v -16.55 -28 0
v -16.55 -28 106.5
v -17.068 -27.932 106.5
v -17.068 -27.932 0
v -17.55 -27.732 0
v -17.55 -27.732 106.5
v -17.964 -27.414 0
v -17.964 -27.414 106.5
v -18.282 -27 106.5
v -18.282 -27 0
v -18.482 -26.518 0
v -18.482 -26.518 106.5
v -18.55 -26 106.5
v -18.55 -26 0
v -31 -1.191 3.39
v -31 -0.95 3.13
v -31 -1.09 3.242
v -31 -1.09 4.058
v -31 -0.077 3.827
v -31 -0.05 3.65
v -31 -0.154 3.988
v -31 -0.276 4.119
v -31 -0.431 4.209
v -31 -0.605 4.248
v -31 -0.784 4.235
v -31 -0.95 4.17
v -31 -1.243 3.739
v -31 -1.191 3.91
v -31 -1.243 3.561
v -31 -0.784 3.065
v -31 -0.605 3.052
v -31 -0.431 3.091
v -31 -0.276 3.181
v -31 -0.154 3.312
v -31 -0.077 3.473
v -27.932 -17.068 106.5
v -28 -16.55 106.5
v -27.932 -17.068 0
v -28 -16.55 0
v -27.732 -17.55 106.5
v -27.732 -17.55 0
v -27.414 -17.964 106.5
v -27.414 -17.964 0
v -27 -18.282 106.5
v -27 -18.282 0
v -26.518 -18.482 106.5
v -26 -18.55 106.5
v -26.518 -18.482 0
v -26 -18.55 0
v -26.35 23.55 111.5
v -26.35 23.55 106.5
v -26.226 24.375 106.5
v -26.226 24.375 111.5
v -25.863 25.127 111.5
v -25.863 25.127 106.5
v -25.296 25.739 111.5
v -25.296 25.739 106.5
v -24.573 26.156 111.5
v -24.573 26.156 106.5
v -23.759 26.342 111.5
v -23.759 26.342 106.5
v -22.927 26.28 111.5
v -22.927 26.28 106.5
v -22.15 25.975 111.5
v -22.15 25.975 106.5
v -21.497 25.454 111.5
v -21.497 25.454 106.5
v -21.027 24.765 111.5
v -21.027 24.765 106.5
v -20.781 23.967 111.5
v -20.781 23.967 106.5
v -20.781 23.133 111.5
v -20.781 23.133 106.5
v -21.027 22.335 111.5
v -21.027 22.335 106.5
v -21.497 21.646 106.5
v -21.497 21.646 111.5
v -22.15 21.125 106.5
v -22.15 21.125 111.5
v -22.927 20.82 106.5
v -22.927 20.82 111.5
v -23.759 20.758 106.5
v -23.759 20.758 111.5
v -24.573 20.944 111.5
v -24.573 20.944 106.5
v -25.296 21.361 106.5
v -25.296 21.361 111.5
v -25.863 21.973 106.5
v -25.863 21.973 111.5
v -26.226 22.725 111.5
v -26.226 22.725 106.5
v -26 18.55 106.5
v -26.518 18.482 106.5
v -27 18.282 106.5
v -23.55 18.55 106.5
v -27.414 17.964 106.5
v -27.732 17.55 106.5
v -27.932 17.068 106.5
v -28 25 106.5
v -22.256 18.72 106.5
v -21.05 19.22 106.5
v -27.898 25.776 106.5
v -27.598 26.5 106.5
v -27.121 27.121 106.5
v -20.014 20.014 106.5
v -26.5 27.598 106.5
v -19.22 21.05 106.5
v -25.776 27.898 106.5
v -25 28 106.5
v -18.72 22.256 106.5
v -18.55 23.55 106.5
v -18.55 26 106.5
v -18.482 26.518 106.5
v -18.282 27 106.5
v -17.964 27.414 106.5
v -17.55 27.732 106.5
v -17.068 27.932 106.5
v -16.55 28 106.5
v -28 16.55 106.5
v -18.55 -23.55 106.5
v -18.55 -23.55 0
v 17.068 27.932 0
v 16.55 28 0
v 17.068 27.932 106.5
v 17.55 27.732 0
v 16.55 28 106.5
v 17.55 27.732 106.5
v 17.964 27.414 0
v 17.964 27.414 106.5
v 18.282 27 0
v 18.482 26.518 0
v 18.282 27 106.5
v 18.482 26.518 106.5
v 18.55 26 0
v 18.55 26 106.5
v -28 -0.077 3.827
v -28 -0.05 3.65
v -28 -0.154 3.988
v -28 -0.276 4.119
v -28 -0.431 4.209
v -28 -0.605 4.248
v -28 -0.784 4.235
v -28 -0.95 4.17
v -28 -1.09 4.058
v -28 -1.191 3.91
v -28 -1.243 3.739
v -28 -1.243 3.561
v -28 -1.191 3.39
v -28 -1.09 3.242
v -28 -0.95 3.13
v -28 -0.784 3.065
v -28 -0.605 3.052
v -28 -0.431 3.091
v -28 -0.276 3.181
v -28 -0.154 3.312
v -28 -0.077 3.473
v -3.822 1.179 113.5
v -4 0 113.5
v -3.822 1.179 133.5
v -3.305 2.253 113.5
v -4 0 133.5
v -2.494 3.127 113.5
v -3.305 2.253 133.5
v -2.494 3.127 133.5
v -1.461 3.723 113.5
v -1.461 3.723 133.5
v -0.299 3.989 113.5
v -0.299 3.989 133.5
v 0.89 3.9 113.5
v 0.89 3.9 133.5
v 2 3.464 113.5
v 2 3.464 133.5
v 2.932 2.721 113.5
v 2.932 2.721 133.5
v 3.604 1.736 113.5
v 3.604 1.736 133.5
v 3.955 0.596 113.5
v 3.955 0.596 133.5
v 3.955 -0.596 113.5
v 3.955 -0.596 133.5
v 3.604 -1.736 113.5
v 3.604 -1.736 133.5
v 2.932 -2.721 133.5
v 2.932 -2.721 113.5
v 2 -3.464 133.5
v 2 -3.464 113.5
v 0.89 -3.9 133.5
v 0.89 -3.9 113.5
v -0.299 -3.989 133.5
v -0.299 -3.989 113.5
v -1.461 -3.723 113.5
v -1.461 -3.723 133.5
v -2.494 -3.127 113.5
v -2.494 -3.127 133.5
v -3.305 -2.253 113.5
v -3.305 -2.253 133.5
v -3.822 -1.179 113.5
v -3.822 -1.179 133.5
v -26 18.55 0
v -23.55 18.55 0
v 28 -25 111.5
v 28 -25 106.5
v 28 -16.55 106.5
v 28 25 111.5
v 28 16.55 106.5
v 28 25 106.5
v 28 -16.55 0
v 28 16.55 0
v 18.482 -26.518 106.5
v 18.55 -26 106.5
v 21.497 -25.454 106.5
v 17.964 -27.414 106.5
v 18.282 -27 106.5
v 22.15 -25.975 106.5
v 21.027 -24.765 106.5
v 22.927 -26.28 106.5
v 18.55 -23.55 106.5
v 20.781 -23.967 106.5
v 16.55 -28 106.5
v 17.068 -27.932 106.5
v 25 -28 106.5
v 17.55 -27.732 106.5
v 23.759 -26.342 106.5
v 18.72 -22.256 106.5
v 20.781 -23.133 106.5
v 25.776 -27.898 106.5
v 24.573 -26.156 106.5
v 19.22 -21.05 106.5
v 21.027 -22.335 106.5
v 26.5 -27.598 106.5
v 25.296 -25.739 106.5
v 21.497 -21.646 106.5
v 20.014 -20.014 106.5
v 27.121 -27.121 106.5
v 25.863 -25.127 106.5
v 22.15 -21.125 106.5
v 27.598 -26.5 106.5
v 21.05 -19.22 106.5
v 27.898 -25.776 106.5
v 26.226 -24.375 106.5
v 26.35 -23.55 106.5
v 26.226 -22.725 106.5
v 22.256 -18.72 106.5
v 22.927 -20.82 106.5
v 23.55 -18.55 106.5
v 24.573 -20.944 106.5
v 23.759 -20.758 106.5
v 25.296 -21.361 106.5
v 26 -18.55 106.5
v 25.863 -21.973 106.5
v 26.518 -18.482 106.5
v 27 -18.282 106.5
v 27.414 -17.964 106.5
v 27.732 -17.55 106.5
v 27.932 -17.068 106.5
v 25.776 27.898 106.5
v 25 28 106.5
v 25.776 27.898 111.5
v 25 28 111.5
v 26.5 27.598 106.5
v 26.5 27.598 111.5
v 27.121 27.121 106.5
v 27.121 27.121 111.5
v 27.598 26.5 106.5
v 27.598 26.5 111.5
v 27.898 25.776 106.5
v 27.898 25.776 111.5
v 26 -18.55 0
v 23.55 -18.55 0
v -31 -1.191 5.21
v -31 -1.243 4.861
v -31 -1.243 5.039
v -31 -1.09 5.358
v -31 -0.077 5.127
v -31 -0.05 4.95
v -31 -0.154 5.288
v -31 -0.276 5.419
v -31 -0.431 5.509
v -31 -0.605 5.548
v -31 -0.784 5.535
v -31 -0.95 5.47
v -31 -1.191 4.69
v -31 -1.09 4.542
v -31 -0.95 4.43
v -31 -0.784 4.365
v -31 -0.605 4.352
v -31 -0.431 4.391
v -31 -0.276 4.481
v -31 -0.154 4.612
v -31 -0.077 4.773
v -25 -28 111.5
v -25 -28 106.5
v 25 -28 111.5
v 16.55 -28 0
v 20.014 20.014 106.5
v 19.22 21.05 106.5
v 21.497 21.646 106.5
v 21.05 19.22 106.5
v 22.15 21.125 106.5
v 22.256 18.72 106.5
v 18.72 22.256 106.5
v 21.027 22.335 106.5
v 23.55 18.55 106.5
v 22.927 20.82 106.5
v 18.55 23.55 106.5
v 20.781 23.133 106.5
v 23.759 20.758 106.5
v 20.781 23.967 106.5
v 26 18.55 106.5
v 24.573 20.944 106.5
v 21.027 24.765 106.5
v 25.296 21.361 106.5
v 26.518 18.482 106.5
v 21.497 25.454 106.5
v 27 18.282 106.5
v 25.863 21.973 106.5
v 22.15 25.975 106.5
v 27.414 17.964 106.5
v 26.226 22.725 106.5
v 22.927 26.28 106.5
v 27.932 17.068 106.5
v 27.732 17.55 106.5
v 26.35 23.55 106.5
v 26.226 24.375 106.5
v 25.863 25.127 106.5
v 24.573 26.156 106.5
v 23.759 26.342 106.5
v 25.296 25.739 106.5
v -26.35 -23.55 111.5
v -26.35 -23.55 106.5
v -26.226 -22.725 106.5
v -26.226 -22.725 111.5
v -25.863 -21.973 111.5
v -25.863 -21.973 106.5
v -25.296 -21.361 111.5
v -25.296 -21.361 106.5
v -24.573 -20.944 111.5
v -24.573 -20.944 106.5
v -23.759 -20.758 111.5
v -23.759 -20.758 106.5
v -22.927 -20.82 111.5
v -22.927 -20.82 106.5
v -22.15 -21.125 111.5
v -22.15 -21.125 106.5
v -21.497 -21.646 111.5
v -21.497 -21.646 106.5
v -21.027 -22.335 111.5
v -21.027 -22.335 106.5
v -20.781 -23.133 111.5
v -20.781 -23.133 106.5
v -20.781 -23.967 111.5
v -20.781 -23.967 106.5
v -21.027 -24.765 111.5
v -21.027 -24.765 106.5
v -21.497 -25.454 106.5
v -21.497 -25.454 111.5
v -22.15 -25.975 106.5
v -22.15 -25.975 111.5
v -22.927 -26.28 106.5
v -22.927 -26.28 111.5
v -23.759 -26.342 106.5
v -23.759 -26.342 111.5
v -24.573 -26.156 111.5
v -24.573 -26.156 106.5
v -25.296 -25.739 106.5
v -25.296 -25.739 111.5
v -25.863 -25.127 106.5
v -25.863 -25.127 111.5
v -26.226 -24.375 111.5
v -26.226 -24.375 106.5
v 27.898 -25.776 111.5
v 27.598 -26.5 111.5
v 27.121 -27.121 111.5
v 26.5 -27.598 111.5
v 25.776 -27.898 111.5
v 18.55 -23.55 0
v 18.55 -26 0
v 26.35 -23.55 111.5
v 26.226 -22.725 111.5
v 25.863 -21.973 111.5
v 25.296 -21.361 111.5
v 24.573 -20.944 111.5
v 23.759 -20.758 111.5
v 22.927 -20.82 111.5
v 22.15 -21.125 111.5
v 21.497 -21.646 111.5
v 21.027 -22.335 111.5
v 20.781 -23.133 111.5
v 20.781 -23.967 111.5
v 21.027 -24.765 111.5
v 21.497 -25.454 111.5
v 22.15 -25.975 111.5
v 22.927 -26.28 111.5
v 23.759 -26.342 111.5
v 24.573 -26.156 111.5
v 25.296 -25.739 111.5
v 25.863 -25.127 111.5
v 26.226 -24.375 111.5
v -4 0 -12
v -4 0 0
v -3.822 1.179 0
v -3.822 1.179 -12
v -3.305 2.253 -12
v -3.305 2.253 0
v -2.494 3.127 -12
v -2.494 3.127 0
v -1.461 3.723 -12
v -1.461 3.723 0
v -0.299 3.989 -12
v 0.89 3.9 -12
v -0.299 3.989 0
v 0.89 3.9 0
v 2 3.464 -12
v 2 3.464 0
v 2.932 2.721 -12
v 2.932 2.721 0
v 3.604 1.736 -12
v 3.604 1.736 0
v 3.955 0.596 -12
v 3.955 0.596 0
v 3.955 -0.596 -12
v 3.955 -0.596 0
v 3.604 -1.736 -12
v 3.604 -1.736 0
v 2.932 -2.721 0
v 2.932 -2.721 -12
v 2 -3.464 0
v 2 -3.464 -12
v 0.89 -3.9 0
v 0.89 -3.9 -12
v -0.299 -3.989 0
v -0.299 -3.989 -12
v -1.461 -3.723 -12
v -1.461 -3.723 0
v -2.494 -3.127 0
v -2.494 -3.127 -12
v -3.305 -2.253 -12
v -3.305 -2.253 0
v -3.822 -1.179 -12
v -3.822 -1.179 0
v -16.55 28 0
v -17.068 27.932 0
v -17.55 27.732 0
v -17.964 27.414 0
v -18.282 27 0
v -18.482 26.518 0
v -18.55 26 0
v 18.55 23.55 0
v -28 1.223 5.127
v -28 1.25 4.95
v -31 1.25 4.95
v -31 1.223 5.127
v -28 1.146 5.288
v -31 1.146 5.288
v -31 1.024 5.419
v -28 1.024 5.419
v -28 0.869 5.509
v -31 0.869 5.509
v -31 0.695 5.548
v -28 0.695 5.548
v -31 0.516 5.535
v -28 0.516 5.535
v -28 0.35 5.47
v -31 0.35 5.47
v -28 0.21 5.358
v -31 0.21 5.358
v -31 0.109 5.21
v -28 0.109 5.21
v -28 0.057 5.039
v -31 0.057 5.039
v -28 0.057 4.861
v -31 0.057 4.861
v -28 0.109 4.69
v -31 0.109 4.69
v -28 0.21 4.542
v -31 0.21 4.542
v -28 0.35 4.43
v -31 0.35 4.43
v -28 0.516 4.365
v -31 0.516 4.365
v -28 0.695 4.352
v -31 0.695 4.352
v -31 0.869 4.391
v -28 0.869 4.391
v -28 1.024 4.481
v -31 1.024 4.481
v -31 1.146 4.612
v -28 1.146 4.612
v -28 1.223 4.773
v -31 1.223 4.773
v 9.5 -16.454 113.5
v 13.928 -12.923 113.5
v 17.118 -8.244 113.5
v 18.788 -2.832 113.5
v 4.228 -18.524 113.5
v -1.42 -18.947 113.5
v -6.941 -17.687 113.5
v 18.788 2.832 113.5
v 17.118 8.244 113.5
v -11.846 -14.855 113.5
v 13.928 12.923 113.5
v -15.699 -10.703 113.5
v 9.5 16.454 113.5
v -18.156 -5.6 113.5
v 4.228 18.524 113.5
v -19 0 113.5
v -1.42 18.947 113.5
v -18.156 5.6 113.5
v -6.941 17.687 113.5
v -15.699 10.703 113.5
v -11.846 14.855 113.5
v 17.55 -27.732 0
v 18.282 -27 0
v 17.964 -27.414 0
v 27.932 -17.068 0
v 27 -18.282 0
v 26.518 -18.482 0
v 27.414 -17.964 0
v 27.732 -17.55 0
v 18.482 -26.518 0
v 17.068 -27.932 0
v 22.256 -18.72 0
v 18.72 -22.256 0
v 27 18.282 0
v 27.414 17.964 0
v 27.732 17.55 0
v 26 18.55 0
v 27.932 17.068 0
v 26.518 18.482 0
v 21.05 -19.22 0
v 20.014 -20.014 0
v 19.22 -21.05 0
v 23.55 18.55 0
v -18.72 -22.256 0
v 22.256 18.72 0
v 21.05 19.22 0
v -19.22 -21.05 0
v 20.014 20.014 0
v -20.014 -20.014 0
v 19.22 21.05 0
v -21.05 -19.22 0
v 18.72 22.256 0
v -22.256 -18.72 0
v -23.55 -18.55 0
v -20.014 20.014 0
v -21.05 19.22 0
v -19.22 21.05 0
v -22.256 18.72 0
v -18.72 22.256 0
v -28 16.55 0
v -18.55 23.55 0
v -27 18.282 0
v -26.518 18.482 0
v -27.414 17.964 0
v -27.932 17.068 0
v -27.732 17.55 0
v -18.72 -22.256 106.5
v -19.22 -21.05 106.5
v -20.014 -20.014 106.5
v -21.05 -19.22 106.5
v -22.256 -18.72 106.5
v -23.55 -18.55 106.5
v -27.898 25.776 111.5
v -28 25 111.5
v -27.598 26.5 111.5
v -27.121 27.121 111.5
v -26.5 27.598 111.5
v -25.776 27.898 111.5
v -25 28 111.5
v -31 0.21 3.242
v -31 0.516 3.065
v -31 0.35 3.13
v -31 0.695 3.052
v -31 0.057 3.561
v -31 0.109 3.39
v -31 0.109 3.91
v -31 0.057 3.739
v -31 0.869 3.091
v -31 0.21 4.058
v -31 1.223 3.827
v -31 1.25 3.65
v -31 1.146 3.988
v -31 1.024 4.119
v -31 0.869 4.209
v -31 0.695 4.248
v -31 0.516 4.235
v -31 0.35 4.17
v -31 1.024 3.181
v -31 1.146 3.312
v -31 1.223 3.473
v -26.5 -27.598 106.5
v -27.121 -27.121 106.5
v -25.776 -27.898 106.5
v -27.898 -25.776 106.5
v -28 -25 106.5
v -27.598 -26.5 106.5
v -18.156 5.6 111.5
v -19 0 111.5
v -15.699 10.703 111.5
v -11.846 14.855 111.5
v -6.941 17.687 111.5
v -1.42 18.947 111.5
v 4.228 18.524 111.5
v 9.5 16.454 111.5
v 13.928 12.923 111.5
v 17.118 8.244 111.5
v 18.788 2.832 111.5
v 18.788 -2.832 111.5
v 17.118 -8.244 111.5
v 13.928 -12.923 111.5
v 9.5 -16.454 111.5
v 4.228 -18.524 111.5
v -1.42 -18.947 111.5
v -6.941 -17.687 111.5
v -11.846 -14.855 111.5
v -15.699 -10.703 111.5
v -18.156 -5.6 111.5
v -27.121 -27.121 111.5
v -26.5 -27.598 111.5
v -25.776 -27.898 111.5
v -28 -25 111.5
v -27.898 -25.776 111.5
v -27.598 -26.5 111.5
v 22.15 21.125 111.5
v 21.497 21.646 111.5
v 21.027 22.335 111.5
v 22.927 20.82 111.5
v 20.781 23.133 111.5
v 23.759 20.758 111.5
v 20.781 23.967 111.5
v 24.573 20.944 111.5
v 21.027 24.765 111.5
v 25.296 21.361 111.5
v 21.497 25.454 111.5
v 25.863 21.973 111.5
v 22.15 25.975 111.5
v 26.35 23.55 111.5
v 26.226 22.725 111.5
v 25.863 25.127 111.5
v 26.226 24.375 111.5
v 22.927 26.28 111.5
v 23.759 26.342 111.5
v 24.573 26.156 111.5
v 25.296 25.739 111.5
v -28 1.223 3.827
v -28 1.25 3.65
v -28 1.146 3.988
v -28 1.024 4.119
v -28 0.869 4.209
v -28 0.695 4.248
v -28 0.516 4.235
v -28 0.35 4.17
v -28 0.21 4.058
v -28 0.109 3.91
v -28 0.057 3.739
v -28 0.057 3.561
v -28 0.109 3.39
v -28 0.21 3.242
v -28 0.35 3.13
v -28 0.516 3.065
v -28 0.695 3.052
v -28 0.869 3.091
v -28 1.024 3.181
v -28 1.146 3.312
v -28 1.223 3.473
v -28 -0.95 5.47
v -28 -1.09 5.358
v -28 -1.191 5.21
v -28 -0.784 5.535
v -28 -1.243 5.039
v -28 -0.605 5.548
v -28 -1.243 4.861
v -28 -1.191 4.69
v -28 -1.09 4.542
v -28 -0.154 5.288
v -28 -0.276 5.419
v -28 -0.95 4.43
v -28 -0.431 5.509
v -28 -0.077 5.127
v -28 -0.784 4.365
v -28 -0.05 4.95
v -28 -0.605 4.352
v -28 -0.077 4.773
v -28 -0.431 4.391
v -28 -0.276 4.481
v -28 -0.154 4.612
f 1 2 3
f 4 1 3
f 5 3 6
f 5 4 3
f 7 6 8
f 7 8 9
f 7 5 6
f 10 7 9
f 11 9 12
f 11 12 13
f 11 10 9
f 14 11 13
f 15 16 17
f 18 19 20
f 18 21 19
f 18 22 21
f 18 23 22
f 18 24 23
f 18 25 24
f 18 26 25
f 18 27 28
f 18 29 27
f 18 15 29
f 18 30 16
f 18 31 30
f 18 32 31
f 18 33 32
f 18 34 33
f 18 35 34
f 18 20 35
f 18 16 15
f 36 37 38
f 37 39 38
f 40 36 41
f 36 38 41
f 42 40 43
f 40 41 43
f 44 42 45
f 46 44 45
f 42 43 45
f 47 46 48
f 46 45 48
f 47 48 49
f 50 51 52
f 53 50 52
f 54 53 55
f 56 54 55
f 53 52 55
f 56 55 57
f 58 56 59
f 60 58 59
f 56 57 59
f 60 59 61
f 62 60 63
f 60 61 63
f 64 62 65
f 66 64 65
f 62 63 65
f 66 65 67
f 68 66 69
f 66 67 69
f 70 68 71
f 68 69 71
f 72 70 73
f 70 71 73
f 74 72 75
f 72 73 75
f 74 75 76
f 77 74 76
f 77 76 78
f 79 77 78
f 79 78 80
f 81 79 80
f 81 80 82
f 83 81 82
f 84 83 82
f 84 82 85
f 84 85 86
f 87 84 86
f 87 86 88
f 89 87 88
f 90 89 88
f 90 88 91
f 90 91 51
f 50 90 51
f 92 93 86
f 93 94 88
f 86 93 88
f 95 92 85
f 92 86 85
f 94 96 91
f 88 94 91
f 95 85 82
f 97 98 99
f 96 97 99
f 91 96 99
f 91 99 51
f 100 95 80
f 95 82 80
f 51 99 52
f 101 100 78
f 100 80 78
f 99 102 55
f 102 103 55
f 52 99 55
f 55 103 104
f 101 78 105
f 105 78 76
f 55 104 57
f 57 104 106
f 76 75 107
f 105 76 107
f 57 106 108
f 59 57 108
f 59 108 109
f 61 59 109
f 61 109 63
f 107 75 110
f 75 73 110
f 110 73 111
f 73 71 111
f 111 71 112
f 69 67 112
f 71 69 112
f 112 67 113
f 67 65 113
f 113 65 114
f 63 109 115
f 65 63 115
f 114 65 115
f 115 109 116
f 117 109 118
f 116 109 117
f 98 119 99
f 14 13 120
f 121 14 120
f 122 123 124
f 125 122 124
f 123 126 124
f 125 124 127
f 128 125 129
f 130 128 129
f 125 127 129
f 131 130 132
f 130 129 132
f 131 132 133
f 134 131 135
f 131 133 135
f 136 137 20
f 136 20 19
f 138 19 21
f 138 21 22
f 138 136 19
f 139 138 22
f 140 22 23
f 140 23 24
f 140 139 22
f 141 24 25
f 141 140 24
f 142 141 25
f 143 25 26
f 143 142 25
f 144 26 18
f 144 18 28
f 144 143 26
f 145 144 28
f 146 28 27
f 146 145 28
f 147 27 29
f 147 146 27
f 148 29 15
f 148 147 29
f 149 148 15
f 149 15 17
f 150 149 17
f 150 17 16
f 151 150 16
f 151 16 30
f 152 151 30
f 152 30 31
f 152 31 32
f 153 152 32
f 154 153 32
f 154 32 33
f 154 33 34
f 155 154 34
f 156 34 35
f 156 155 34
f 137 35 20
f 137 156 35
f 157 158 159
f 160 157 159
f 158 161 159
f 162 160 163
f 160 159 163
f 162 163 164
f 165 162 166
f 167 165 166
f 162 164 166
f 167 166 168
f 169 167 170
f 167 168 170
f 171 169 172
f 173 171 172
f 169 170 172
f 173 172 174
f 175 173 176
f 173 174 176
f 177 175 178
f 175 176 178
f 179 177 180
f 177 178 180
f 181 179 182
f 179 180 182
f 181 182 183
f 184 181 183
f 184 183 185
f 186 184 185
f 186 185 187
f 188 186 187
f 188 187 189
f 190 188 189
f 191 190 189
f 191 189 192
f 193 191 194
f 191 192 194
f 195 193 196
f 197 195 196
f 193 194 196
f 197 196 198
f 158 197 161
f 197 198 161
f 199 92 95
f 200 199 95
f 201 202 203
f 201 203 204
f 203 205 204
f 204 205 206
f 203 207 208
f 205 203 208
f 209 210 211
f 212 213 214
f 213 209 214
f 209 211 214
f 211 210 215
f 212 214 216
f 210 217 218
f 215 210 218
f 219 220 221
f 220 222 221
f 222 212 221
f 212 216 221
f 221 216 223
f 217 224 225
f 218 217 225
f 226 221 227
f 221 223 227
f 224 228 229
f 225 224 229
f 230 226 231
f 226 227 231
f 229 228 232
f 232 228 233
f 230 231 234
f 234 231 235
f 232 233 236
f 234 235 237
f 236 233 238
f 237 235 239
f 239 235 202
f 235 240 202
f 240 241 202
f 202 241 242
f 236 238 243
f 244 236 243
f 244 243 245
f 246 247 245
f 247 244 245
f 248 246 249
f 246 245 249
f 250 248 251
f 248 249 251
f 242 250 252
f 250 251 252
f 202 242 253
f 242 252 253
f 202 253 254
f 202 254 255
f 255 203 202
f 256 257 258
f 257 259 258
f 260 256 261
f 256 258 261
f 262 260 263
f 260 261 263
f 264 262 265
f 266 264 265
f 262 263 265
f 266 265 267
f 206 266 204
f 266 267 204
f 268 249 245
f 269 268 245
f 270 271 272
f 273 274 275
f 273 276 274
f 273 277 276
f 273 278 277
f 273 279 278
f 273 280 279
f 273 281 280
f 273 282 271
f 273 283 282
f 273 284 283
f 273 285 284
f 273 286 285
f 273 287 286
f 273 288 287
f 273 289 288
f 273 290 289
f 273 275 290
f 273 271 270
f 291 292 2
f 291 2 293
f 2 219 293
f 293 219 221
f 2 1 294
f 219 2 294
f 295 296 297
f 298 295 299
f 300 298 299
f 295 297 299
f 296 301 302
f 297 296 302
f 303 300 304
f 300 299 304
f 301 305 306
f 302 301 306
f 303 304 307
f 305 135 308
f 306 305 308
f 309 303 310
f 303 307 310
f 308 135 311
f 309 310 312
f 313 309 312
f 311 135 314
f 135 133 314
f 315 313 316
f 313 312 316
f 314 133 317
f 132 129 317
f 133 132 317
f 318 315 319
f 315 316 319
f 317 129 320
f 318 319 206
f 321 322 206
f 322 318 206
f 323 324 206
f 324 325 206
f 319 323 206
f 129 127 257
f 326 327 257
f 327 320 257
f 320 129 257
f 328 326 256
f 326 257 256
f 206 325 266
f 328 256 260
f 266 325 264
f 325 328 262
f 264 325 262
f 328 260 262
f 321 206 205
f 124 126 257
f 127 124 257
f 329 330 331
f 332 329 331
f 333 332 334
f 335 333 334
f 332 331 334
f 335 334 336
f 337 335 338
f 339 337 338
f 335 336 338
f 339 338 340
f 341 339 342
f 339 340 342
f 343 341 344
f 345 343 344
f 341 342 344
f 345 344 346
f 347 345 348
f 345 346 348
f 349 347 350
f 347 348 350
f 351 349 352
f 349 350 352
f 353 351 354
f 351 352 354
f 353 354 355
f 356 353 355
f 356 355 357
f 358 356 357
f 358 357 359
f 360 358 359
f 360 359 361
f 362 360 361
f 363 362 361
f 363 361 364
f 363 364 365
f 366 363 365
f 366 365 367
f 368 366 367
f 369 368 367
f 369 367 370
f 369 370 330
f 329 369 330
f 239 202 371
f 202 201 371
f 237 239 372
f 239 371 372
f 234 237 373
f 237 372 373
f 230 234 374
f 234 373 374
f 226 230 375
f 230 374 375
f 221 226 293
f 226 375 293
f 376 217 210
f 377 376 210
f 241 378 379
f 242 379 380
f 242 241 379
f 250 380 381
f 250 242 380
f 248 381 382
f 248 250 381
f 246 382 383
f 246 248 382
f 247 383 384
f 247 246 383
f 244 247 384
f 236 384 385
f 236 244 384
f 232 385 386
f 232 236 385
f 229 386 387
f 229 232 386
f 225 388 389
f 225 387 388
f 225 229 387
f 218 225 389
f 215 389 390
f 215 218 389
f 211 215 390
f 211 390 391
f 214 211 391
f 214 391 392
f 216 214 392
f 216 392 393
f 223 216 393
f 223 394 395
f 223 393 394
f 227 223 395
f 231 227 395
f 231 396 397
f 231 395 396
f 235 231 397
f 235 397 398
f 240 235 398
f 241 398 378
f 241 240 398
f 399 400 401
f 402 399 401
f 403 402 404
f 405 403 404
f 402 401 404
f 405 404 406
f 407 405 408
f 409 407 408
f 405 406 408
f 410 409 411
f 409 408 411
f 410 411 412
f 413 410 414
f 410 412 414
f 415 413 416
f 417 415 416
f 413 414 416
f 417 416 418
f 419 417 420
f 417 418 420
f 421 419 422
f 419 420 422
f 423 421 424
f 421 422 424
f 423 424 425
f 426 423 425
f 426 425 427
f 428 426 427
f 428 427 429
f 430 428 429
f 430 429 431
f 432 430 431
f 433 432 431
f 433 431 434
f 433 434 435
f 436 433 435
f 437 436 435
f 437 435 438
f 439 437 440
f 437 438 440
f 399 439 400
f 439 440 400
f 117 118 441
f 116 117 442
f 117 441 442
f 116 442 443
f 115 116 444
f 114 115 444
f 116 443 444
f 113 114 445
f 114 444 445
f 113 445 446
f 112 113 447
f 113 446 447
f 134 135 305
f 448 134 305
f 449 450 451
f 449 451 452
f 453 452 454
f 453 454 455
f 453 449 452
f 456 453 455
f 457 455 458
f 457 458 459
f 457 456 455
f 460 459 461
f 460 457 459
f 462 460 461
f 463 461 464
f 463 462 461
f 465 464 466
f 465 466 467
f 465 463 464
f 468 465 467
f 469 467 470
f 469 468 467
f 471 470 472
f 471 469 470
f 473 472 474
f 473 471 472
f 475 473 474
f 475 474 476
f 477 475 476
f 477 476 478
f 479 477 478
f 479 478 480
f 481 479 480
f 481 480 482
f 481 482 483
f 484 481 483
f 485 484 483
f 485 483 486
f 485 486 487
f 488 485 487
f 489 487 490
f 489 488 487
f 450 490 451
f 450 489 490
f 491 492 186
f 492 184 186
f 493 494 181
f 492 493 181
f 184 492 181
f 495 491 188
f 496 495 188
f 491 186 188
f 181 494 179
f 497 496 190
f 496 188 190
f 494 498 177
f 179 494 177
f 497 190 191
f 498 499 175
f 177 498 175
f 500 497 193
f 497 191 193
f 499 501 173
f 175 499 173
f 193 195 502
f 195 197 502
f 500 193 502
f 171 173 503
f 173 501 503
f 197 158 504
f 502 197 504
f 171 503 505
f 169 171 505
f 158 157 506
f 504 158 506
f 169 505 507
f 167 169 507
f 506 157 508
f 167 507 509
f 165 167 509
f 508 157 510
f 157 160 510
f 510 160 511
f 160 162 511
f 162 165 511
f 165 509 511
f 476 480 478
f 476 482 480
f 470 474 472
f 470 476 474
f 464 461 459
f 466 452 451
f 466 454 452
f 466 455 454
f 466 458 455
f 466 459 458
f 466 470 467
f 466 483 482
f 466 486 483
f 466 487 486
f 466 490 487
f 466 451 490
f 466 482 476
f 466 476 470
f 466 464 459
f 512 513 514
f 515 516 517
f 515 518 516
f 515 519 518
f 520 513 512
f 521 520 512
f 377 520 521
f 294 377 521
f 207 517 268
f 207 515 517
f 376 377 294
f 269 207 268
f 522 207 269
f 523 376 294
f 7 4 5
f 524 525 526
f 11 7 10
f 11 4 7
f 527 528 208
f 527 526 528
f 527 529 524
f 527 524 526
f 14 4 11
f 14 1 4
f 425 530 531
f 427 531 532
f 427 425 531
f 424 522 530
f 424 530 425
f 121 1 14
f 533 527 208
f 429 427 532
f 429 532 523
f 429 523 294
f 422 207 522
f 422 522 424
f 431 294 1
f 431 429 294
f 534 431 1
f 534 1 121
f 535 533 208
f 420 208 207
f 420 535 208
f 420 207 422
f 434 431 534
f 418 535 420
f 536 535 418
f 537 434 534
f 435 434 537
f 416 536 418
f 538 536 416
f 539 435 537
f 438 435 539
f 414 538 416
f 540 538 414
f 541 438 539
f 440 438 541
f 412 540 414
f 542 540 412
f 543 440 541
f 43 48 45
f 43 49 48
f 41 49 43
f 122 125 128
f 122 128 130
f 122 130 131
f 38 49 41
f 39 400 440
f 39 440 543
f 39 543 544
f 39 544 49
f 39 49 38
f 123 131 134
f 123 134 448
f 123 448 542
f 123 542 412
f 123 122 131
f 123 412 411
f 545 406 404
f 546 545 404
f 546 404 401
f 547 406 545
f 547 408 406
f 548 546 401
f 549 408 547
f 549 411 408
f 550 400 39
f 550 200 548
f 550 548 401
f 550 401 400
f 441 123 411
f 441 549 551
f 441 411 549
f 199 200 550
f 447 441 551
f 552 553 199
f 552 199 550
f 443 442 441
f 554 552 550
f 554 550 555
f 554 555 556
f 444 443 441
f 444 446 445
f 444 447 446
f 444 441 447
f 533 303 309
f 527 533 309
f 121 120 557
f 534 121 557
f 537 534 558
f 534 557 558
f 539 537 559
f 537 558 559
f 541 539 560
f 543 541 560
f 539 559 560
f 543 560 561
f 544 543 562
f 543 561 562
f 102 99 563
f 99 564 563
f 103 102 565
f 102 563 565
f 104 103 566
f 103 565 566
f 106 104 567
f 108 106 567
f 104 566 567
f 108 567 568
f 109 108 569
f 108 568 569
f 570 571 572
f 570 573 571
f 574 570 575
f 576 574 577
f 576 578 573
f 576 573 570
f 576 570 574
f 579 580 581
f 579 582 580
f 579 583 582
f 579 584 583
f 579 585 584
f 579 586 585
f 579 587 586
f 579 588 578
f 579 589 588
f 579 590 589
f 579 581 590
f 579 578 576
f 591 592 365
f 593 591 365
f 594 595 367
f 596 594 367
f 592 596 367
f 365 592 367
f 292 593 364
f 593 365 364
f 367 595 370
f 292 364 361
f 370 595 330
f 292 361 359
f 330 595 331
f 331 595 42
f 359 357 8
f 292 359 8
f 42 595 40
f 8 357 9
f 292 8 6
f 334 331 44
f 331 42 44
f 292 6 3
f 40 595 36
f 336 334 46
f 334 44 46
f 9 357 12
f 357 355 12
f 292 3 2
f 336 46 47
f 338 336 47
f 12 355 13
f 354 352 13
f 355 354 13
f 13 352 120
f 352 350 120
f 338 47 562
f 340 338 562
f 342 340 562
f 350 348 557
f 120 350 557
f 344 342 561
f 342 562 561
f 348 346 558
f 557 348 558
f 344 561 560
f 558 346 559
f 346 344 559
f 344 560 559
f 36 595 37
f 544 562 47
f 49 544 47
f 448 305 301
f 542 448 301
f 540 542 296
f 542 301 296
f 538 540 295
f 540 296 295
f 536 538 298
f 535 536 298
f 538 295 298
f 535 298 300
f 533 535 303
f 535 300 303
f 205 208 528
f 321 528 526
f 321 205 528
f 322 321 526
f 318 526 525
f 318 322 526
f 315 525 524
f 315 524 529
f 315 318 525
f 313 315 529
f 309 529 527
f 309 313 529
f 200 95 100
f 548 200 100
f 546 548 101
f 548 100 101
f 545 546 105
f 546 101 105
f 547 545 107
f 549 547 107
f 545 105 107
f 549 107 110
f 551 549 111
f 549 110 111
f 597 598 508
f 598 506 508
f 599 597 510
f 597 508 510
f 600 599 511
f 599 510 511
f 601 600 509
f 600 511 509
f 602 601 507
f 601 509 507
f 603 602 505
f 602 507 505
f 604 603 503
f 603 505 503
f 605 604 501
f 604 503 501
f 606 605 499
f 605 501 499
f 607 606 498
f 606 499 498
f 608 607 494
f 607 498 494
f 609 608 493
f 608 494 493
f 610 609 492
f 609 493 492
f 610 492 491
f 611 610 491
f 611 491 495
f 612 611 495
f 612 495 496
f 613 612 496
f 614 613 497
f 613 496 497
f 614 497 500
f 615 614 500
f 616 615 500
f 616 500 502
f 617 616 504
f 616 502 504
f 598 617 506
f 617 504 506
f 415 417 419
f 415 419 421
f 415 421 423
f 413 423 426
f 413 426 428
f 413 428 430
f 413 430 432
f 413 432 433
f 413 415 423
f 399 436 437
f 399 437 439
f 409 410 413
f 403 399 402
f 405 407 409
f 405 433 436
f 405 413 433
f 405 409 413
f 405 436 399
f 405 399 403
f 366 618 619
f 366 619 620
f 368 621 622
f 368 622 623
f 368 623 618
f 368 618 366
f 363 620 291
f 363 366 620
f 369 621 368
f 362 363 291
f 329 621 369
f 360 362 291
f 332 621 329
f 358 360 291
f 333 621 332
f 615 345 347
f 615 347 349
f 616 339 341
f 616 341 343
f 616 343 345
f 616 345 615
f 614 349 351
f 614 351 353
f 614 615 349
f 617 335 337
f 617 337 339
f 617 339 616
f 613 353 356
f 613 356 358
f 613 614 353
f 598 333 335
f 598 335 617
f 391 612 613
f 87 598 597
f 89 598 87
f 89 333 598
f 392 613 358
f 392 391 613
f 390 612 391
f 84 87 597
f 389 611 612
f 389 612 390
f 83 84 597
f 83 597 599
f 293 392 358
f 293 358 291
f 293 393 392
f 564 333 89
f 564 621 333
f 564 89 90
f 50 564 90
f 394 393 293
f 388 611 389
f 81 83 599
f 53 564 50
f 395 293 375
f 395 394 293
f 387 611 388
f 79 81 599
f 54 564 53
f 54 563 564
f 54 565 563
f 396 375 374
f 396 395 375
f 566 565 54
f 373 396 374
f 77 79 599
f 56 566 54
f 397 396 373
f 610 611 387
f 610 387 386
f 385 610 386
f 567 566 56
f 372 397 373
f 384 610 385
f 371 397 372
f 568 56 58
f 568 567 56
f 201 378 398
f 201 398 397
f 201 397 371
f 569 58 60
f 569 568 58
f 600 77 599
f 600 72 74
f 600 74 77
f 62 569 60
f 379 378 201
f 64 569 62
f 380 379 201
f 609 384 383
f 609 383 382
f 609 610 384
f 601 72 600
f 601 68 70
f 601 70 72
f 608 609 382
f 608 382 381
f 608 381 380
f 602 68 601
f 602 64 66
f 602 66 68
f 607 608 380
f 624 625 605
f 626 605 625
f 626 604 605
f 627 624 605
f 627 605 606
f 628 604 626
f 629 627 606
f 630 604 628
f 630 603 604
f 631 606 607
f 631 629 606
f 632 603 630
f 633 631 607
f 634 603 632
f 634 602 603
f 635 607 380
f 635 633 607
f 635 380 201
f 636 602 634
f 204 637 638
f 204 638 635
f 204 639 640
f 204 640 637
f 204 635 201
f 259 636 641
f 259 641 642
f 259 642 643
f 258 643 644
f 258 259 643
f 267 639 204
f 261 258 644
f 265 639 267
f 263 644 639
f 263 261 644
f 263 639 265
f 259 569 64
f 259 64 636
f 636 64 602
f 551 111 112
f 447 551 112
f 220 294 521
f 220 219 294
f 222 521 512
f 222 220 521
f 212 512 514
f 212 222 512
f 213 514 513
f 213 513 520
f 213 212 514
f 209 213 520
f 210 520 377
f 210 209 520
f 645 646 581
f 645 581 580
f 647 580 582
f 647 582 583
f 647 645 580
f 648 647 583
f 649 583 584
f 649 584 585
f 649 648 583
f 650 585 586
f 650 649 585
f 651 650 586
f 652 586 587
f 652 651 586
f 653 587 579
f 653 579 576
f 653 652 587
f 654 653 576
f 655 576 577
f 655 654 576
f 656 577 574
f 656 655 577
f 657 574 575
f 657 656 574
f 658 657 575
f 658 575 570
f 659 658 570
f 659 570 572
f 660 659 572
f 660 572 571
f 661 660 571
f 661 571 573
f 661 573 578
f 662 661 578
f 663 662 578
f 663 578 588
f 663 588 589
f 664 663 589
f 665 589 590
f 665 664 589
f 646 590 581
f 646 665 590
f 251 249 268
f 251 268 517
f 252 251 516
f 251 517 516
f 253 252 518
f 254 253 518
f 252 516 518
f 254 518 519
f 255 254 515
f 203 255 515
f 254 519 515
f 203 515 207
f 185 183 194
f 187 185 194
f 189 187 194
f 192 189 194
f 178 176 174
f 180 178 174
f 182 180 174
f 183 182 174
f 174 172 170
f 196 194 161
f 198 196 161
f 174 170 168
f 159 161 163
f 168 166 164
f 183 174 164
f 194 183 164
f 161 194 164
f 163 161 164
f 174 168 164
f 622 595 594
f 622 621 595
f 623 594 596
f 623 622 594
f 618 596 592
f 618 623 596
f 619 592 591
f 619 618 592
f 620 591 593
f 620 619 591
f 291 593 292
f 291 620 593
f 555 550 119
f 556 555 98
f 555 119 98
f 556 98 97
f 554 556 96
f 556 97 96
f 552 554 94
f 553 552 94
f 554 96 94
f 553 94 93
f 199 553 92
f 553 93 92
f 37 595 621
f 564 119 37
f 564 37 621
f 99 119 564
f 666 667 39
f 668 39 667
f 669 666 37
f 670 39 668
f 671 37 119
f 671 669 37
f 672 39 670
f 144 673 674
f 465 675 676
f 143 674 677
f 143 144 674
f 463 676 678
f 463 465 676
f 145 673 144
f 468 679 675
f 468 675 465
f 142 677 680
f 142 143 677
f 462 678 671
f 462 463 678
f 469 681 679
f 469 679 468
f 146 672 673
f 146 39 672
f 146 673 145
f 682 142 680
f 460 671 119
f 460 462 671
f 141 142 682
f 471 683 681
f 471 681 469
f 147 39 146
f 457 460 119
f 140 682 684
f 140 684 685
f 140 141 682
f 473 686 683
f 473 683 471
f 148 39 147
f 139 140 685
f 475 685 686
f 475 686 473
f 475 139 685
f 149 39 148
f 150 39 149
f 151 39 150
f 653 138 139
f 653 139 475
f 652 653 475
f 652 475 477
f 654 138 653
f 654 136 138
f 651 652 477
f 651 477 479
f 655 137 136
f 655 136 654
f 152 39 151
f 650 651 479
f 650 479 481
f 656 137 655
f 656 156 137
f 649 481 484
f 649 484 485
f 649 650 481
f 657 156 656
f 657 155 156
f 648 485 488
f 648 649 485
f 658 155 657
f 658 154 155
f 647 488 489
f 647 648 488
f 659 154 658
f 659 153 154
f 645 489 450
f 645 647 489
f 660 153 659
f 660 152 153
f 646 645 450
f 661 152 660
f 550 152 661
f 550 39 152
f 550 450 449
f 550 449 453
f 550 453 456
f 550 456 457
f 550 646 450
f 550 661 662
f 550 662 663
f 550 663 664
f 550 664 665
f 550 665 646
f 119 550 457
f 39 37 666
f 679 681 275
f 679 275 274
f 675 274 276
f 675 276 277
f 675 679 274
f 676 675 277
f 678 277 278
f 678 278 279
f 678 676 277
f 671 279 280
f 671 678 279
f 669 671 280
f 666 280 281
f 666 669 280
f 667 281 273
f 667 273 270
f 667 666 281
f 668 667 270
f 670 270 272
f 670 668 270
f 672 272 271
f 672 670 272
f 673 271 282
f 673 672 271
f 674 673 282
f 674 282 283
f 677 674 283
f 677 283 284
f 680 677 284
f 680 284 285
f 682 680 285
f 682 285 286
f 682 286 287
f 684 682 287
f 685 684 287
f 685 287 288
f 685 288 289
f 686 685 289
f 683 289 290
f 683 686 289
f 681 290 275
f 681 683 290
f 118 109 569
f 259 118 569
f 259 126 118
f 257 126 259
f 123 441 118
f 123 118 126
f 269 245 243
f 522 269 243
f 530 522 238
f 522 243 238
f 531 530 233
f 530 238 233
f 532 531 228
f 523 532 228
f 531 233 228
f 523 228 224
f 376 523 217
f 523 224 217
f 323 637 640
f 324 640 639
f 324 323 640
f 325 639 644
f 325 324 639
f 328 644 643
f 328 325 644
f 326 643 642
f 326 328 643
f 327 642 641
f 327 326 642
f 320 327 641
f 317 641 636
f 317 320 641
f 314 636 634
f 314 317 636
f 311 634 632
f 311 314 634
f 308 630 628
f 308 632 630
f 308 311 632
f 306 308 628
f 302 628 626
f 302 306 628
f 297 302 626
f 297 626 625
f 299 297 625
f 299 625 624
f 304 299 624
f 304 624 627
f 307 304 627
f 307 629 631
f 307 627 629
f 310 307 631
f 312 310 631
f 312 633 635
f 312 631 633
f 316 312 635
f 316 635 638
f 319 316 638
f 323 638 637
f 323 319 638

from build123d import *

# Parameters (mm, degrees)
BOSS_EXTRUDE1_DEPTH     = 11.5
BOSS_EXTRUDE2_DEPTH     = 90
SKETCH3_W               = 56
SKETCH3_H               = 56
BOSS_EXTRUDE3_DEPTH     = 10
SKETCH4_W               = 10
SKETCH4_H               = 0.6
SKETCH5_W               = 10
SKETCH5_H               = 0.6
SKETCH6_W               = 10
SKETCH6_H               = 0.6
SKETCH7_W               = 10
SKETCH7_H               = 0.6
HOLE1_D                 = 5.6
HOLE1_DEPTH             = 5
HOLE2_D                 = 5.6
HOLE2_DEPTH             = 5
CUT_EXTRUDE9_DEPTH      = 110.759965379
CUT_EXTRUDE9_DEPTH_BACK = 5
FILLET3_R               = 2
FILLET4_R               = 3
SKETCH17_R              = 4
BOSS_EXTRUDE4_DEPTH     = 12


with BuildPart() as part:
    # Sketch1 → Boss-Extrude1 (new body)
    with BuildSketch(Plane(origin=(0, 0, 0), x_dir=(-1, 0, 0), z_dir=(0, 0, -1))):
        Polygon((-23, 28), (-28, 23), (-28, -23), (-23, -28), (23, -28), (28, -23), (28, 23), (23, 28), align=None)
    extrude(amount=-BOSS_EXTRUDE1_DEPTH)

    # Sketch2 → Boss-Extrude2 (add)
    with BuildSketch(Plane.XY.offset(11.5)):
        Polygon((23, 28), (-23, 28), (-28, 23), (-28, -23), (-23, -28), (23, -28), (28, -23), (28, 23), align=None)
    extrude(amount=BOSS_EXTRUDE2_DEPTH)

    # Sketch3 → Boss-Extrude3 (add)
    with BuildSketch(Plane.XY.offset(101.5)):
        Rectangle(SKETCH3_W, SKETCH3_H)
    extrude(amount=BOSS_EXTRUDE3_DEPTH)

    # Sketch4 → Revolve1 (revolve)
    with BuildSketch(Plane.XY.offset(3.65)):
        with Locations((-26, 0.95)):
            Rectangle(SKETCH4_W, SKETCH4_H)
    revolve(axis=Axis((-31, 0.65, 3.65), (1, 0, 0)))

    # Sketch5 → Revolve2 (revolve)
    with BuildSketch(Plane.XY.offset(3.65)):
        with Locations((-26, -0.35)):
            Rectangle(SKETCH5_W, SKETCH5_H)
    revolve(axis=Axis((-31, -0.65, 3.65), (1, 0, 0)))

    # Sketch6 → Revolve3 (revolve)
    with BuildSketch(Plane.XY.offset(4.95)):
        with Locations((-26, -0.35)):
            Rectangle(SKETCH6_W, SKETCH6_H)
    revolve(axis=Axis((-31, -0.65, 4.95), (1, 0, 0)))

    # Sketch7 → Revolve4 (revolve)
    with BuildSketch(Plane.XY.offset(4.95)):
        with Locations((-26, 0.95)):
            Rectangle(SKETCH7_W, SKETCH7_H)
    revolve(axis=Axis((-31, 0.65, 4.95), (1, 0, 0)))

    # Sketch8 → Revolve5 (revolve)
    with BuildSketch(Plane.XZ, mode=Mode.PRIVATE) as revolve5_sk:
        Polygon((4, 133.5), (0, 133.5), (0, 111.5), (19, 111.5), (19, 113.5), (4, 113.5), align=None)
    revolve(revolve5_sk.sketch.rotate(Axis((0, 0, 133.5), (0, 0, -1)), 180), axis=Axis((0, 0, 133.5), (0, 0, -1)))

    # Hole1
    with Locations(Plane.XY.offset(111.5)):
        with Locations((-23.55, 23.55)):
            hole1 = Hole(HOLE1_D / 2, depth=HOLE1_DEPTH)

    # Hole2
    with Locations(Plane.XY.offset(111.5)):
        with Locations((-23.55, -23.55), (-23.55, 23.55)):
            hole2 = Hole(HOLE2_D / 2, depth=HOLE2_DEPTH)

    # Mirror2: Hole1, Hole2 across plane
    add(hole1.mirror(Plane(origin=(0, 0, 0), x_dir=(0, 0, 1), z_dir=(1, 0, 0))), mode=Mode.SUBTRACT)
    add(hole2.mirror(Plane(origin=(0, 0, 0), x_dir=(0, 0, 1), z_dir=(1, 0, 0))), mode=Mode.SUBTRACT)

    # Sketch34 → Cut-Extrude9 (cut, two sides: drawn at the far end of the back side and taken through both)
    with BuildSketch(Plane(origin=(0, 0, 101.5), x_dir=(-1, 0, 0), z_dir=(0, 0, -1)).offset(-CUT_EXTRUDE9_DEPTH_BACK)):
        with BuildLine():
            Line((18.55, 23.55), (18.55, 34.67124832))
            Line((18.55, 34.67124832), (31.974713938, 34.67124832))
            Line((31.974713938, 34.67124832), (31.974713938, 18.55))
            Line((31.974713938, 18.55), (23.55, 18.55))
            ThreePointArc((23.55, 18.55), (20.014466094, 20.014466094), (18.55, 23.55))
        make_face()
        with BuildLine():
            Line((23.55, -18.55), (31.974713938, -18.55))
            Line((31.974713938, -18.55), (31.974713938, -34.67124832))
            Line((31.974713938, -34.67124832), (18.55, -34.67124832))
            Line((18.55, -34.67124832), (18.55, -23.55))
            ThreePointArc((18.55, -23.55), (20.014466094, -20.014466094), (23.55, -18.55))
        make_face()
        with BuildLine():
            Line((-18.55, -23.55), (-18.55, -34.67124832))
            Line((-18.55, -34.67124832), (-31.974713938, -34.67124832))
            Line((-31.974713938, -34.67124832), (-31.974713938, -18.55))
            Line((-31.974713938, -18.55), (-23.55, -18.55))
            ThreePointArc((-23.55, -18.55), (-20.014466094, -20.014466094), (-18.55, -23.55))
        make_face()
        with BuildLine():
            Line((-23.55, 18.55), (-31.974713938, 18.55))
            Line((-31.974713938, 18.55), (-31.974713938, 34.67124832))
            Line((-31.974713938, 34.67124832), (-18.55, 34.67124832))
            Line((-18.55, 34.67124832), (-18.55, 23.55))
            ThreePointArc((-18.55, 23.55), (-20.014466094, 20.014466094), (-23.55, 18.55))
        make_face()
    extrude(amount=CUT_EXTRUDE9_DEPTH + CUT_EXTRUDE9_DEPTH_BACK, mode=Mode.SUBTRACT)

    # Fillet3
    fillet3_edges = [part.edges().sort_by_distance(p)[0] for p in [
        (18.55, 28, 53.25),
        (28, 18.55, 53.25),
        (28, -18.55, 53.25),
        (18.55, -28, 53.25),
        (-18.55, -28, 53.25),
        (-28, -18.55, 53.25),
        (-28, 18.55, 53.25),
        (-18.55, 28, 53.25),
    ]]
    fillet(fillet3_edges, radius=FILLET3_R)

    # Fillet4
    fillet4_edges = [part.edges().sort_by_distance(p)[0] for p in [
        (28, -28, 109),
        (28, 28, 109),
        (-28, 28, 109),
        (-28, -28, 109),
    ]]
    fillet(fillet4_edges, radius=FILLET4_R)

    # Sketch17 → Boss-Extrude4 (add)
    with BuildSketch(Plane(origin=(0, 0, 0), x_dir=(-1, 0, 0), z_dir=(0, 0, -1))):
        Circle(SKETCH17_R)
    extrude(amount=BOSS_EXTRUDE4_DEPTH)


solid = part.part
